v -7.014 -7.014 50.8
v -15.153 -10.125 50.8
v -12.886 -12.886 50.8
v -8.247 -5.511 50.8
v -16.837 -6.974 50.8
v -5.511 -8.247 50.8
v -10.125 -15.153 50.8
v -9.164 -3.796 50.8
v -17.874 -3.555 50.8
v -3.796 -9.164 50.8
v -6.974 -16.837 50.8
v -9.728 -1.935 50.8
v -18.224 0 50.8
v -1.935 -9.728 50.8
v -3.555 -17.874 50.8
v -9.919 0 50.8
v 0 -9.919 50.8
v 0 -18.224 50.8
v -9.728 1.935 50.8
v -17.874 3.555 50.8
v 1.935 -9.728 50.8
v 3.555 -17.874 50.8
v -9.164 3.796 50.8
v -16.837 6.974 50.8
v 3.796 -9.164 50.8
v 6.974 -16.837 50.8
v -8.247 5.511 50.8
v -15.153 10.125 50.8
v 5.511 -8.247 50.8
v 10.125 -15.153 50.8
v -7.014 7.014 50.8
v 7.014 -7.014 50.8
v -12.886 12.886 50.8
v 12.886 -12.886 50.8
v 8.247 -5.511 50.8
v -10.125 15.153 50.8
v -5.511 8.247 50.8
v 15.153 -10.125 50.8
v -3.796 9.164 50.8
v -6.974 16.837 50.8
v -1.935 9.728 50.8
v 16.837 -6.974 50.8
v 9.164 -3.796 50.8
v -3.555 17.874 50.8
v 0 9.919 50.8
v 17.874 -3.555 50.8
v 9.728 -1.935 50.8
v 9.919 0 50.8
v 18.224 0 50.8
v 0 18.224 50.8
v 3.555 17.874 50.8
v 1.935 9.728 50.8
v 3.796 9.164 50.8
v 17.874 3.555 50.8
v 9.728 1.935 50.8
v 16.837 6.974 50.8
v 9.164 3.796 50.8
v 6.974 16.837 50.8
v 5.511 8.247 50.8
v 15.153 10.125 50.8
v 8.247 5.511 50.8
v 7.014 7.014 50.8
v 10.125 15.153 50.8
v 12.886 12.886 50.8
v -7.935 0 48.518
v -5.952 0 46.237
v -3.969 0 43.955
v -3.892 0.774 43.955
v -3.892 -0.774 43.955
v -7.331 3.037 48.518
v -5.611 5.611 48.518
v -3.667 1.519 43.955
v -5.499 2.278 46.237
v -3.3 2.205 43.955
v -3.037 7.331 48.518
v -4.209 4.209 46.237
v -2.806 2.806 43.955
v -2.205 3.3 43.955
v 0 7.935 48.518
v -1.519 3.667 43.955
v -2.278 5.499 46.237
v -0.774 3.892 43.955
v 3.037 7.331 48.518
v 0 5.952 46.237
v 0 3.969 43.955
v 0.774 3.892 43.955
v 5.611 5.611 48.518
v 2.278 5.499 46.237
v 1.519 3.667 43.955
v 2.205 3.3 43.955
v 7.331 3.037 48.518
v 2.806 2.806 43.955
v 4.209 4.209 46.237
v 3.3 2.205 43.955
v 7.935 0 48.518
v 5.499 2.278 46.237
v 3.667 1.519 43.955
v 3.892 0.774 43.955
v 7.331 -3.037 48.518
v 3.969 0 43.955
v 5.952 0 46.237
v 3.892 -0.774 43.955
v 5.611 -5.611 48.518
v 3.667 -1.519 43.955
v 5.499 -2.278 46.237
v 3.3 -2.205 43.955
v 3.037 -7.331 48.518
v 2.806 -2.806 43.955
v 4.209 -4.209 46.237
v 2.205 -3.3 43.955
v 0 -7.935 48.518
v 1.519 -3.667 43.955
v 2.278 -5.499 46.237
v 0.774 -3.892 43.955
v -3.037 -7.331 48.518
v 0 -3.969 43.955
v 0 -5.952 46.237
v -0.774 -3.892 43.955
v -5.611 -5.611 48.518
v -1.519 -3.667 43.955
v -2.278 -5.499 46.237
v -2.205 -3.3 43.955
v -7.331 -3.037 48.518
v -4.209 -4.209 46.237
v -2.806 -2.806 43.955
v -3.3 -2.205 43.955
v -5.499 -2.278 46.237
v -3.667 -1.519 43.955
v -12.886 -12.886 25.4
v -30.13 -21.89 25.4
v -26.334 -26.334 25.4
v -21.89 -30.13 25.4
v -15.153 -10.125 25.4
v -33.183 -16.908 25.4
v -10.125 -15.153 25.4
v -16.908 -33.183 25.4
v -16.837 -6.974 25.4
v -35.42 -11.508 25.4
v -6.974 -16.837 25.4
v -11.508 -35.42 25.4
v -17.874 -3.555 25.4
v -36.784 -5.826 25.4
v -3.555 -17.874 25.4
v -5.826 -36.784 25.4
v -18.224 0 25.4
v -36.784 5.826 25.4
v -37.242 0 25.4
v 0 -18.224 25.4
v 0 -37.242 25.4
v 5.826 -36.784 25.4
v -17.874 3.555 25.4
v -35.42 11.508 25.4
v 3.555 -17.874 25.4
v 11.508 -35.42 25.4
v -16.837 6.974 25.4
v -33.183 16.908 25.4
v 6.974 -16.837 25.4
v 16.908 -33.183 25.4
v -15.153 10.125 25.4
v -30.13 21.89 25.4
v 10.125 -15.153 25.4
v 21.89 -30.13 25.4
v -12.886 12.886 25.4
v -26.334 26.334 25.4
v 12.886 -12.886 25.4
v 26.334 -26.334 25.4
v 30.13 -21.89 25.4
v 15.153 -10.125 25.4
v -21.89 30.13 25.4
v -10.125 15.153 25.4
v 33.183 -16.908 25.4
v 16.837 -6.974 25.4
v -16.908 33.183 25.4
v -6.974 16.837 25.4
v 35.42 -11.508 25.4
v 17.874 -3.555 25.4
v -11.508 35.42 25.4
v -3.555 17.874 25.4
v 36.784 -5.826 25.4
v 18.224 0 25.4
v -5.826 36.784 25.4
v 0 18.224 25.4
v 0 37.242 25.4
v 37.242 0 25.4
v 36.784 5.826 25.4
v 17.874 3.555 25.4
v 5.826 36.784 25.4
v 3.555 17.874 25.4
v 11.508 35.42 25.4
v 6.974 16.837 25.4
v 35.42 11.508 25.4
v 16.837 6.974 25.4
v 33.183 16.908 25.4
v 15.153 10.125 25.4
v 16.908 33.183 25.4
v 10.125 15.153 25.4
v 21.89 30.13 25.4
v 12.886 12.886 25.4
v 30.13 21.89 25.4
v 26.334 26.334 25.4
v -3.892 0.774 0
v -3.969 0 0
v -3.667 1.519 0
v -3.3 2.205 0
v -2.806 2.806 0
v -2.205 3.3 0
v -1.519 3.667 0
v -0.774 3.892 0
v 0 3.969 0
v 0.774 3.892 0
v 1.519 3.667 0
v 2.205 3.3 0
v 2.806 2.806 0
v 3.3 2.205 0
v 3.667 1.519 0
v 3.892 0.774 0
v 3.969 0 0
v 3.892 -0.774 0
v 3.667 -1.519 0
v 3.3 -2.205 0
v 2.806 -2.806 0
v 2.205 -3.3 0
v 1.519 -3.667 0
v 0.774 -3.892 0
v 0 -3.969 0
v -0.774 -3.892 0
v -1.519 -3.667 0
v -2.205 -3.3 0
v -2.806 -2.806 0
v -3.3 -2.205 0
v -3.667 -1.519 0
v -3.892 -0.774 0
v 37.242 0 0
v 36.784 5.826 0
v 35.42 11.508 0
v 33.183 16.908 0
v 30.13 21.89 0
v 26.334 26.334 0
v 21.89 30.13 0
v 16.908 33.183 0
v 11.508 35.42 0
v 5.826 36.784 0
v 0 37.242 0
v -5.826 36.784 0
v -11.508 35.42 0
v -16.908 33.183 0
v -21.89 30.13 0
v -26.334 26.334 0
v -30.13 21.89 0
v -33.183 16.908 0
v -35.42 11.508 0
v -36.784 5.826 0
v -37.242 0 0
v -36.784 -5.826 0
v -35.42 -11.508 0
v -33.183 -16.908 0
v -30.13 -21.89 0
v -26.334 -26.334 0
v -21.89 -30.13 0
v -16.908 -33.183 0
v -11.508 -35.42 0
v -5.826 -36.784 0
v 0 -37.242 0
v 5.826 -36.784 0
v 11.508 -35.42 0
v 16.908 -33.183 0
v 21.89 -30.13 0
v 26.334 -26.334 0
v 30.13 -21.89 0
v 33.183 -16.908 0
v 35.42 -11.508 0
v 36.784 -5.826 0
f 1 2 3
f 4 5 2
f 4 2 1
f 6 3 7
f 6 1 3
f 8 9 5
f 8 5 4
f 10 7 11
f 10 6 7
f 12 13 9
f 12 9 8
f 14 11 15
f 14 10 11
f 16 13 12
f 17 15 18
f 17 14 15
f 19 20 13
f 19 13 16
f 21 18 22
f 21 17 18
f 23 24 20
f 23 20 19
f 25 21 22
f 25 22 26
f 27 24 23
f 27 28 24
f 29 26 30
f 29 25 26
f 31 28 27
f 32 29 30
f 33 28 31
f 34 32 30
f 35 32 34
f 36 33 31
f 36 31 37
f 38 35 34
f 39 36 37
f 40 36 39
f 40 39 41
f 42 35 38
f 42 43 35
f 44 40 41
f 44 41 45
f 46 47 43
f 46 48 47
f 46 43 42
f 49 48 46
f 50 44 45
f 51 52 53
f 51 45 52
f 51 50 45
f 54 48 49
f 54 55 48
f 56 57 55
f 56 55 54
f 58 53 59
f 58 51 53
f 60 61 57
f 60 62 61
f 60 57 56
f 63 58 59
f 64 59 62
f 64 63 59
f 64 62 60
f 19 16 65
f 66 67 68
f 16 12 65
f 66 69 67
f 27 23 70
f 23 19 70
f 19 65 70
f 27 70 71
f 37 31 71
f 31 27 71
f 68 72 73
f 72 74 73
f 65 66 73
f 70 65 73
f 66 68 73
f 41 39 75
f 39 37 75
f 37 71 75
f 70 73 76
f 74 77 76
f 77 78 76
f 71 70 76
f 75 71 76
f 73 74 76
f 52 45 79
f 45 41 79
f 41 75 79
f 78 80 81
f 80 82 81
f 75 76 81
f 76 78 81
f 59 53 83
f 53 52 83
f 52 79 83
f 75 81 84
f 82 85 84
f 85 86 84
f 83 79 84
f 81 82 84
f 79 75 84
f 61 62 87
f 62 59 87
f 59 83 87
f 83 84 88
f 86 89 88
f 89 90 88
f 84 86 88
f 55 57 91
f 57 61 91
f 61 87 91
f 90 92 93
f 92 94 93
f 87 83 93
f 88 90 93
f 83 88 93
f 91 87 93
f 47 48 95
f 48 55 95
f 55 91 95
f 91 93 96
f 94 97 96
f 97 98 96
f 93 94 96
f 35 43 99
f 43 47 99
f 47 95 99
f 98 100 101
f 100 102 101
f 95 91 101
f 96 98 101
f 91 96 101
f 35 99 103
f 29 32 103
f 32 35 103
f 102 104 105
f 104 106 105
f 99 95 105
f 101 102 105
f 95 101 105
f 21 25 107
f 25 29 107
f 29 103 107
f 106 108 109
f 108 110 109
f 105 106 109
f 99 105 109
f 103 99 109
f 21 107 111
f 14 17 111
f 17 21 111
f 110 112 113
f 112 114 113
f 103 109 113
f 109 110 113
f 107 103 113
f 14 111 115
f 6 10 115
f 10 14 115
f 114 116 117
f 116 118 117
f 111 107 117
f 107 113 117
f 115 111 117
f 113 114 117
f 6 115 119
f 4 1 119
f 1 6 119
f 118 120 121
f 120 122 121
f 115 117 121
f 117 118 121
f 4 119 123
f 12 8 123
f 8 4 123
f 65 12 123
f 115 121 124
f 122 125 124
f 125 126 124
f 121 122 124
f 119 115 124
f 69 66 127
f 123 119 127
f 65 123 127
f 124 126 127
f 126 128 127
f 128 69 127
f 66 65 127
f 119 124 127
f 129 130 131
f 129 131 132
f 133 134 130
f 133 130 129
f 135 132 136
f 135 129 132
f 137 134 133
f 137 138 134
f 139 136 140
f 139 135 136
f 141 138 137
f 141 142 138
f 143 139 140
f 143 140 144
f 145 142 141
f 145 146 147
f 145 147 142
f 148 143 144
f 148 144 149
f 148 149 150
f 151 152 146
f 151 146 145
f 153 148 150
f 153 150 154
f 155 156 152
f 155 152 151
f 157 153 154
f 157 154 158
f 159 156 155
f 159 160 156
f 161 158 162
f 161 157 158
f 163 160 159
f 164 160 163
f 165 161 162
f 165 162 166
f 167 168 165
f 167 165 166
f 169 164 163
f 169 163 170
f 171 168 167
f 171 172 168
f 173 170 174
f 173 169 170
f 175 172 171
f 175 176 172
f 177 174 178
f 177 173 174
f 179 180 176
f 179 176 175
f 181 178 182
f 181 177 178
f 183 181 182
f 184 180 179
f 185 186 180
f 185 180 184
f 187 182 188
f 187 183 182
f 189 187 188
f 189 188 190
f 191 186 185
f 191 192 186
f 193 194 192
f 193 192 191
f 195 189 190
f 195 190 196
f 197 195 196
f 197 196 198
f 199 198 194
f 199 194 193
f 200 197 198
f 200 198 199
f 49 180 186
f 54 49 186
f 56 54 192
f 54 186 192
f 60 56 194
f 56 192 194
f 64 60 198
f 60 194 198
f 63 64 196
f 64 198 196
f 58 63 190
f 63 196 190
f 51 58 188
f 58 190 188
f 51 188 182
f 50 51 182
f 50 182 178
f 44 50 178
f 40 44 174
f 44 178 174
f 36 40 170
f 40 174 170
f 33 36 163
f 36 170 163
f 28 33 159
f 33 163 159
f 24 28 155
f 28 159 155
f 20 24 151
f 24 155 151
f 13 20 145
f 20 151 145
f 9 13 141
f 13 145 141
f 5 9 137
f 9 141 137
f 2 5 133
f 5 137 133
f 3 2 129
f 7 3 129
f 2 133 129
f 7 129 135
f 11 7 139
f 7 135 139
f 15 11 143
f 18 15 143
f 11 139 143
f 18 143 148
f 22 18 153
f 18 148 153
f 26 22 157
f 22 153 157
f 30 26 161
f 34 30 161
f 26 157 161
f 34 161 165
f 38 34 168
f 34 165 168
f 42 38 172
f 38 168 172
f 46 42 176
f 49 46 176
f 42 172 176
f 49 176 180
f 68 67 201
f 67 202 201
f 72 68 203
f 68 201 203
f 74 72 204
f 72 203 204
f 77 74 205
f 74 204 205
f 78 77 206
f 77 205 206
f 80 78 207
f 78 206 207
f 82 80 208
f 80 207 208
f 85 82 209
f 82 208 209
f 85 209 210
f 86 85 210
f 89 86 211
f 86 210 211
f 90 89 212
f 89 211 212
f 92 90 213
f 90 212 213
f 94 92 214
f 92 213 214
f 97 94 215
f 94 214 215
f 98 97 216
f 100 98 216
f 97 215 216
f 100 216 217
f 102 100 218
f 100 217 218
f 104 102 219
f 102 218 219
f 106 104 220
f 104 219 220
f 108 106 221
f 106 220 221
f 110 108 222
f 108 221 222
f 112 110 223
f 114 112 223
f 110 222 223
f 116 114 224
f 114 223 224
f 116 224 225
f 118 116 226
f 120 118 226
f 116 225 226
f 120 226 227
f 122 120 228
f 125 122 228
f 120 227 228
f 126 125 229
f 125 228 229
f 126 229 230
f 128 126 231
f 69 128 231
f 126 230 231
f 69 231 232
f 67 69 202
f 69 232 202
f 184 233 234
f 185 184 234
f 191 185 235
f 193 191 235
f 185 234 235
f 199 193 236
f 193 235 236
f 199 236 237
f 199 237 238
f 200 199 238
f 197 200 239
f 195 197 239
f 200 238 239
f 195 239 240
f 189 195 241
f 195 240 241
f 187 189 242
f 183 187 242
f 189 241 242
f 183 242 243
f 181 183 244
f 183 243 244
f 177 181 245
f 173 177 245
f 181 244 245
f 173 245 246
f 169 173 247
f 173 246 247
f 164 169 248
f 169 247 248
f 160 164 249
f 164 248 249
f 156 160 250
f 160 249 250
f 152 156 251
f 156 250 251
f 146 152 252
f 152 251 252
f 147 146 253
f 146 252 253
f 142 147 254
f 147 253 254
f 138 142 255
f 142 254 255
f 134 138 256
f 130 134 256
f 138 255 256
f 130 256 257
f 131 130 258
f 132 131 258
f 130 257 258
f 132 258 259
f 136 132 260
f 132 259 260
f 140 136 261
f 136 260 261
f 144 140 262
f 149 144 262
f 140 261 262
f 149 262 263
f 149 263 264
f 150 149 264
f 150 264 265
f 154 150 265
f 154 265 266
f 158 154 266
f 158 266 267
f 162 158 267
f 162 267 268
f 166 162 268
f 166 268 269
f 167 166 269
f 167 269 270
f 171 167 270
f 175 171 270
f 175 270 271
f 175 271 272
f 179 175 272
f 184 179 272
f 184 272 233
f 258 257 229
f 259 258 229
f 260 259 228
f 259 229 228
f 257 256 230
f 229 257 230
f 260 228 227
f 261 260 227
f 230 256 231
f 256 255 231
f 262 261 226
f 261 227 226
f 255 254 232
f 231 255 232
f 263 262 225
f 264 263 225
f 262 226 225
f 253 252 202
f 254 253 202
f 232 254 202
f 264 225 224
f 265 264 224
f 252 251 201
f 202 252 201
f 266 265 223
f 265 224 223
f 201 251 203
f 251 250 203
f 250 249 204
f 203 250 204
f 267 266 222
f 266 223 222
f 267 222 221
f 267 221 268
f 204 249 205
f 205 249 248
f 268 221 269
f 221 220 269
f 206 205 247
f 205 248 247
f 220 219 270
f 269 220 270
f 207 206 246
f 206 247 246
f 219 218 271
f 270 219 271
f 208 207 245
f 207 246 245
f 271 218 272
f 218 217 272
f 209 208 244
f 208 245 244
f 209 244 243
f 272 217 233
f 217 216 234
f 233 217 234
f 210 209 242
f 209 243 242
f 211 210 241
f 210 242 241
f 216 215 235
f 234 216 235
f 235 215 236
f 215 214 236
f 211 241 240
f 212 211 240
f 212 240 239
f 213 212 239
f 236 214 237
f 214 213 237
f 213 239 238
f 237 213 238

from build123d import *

# Parameters (mm, degrees)
F0_R           = 37.2422807911
F1_DEPTH       = 25.4
F2_R           = 18.2238332667
F3_DEPTH       = 25.4
F5_D           = 7.9375
F5_CSINK_D     = 19.8374
F5_CSINK_ANGLE = 82


with BuildPart() as f1:
    # F0 (on Top) → F1 (new body)
    with BuildSketch(Plane.XY):
        Circle(F0_R)
    extrude(amount=F1_DEPTH)

    # F2 (on face) → F3 (join)
    with BuildSketch(Plane.XY.offset(25.4)):
        Circle(F2_R)
    extrude(amount=F3_DEPTH)

    # F5 (through all)
    with Locations(Plane.XY.offset(50.8)):
        with Locations((0, 0)):
            CounterSinkHole(F5_D / 2, F5_CSINK_D / 2, counter_sink_angle=F5_CSINK_ANGLE)


solid = f1.part
